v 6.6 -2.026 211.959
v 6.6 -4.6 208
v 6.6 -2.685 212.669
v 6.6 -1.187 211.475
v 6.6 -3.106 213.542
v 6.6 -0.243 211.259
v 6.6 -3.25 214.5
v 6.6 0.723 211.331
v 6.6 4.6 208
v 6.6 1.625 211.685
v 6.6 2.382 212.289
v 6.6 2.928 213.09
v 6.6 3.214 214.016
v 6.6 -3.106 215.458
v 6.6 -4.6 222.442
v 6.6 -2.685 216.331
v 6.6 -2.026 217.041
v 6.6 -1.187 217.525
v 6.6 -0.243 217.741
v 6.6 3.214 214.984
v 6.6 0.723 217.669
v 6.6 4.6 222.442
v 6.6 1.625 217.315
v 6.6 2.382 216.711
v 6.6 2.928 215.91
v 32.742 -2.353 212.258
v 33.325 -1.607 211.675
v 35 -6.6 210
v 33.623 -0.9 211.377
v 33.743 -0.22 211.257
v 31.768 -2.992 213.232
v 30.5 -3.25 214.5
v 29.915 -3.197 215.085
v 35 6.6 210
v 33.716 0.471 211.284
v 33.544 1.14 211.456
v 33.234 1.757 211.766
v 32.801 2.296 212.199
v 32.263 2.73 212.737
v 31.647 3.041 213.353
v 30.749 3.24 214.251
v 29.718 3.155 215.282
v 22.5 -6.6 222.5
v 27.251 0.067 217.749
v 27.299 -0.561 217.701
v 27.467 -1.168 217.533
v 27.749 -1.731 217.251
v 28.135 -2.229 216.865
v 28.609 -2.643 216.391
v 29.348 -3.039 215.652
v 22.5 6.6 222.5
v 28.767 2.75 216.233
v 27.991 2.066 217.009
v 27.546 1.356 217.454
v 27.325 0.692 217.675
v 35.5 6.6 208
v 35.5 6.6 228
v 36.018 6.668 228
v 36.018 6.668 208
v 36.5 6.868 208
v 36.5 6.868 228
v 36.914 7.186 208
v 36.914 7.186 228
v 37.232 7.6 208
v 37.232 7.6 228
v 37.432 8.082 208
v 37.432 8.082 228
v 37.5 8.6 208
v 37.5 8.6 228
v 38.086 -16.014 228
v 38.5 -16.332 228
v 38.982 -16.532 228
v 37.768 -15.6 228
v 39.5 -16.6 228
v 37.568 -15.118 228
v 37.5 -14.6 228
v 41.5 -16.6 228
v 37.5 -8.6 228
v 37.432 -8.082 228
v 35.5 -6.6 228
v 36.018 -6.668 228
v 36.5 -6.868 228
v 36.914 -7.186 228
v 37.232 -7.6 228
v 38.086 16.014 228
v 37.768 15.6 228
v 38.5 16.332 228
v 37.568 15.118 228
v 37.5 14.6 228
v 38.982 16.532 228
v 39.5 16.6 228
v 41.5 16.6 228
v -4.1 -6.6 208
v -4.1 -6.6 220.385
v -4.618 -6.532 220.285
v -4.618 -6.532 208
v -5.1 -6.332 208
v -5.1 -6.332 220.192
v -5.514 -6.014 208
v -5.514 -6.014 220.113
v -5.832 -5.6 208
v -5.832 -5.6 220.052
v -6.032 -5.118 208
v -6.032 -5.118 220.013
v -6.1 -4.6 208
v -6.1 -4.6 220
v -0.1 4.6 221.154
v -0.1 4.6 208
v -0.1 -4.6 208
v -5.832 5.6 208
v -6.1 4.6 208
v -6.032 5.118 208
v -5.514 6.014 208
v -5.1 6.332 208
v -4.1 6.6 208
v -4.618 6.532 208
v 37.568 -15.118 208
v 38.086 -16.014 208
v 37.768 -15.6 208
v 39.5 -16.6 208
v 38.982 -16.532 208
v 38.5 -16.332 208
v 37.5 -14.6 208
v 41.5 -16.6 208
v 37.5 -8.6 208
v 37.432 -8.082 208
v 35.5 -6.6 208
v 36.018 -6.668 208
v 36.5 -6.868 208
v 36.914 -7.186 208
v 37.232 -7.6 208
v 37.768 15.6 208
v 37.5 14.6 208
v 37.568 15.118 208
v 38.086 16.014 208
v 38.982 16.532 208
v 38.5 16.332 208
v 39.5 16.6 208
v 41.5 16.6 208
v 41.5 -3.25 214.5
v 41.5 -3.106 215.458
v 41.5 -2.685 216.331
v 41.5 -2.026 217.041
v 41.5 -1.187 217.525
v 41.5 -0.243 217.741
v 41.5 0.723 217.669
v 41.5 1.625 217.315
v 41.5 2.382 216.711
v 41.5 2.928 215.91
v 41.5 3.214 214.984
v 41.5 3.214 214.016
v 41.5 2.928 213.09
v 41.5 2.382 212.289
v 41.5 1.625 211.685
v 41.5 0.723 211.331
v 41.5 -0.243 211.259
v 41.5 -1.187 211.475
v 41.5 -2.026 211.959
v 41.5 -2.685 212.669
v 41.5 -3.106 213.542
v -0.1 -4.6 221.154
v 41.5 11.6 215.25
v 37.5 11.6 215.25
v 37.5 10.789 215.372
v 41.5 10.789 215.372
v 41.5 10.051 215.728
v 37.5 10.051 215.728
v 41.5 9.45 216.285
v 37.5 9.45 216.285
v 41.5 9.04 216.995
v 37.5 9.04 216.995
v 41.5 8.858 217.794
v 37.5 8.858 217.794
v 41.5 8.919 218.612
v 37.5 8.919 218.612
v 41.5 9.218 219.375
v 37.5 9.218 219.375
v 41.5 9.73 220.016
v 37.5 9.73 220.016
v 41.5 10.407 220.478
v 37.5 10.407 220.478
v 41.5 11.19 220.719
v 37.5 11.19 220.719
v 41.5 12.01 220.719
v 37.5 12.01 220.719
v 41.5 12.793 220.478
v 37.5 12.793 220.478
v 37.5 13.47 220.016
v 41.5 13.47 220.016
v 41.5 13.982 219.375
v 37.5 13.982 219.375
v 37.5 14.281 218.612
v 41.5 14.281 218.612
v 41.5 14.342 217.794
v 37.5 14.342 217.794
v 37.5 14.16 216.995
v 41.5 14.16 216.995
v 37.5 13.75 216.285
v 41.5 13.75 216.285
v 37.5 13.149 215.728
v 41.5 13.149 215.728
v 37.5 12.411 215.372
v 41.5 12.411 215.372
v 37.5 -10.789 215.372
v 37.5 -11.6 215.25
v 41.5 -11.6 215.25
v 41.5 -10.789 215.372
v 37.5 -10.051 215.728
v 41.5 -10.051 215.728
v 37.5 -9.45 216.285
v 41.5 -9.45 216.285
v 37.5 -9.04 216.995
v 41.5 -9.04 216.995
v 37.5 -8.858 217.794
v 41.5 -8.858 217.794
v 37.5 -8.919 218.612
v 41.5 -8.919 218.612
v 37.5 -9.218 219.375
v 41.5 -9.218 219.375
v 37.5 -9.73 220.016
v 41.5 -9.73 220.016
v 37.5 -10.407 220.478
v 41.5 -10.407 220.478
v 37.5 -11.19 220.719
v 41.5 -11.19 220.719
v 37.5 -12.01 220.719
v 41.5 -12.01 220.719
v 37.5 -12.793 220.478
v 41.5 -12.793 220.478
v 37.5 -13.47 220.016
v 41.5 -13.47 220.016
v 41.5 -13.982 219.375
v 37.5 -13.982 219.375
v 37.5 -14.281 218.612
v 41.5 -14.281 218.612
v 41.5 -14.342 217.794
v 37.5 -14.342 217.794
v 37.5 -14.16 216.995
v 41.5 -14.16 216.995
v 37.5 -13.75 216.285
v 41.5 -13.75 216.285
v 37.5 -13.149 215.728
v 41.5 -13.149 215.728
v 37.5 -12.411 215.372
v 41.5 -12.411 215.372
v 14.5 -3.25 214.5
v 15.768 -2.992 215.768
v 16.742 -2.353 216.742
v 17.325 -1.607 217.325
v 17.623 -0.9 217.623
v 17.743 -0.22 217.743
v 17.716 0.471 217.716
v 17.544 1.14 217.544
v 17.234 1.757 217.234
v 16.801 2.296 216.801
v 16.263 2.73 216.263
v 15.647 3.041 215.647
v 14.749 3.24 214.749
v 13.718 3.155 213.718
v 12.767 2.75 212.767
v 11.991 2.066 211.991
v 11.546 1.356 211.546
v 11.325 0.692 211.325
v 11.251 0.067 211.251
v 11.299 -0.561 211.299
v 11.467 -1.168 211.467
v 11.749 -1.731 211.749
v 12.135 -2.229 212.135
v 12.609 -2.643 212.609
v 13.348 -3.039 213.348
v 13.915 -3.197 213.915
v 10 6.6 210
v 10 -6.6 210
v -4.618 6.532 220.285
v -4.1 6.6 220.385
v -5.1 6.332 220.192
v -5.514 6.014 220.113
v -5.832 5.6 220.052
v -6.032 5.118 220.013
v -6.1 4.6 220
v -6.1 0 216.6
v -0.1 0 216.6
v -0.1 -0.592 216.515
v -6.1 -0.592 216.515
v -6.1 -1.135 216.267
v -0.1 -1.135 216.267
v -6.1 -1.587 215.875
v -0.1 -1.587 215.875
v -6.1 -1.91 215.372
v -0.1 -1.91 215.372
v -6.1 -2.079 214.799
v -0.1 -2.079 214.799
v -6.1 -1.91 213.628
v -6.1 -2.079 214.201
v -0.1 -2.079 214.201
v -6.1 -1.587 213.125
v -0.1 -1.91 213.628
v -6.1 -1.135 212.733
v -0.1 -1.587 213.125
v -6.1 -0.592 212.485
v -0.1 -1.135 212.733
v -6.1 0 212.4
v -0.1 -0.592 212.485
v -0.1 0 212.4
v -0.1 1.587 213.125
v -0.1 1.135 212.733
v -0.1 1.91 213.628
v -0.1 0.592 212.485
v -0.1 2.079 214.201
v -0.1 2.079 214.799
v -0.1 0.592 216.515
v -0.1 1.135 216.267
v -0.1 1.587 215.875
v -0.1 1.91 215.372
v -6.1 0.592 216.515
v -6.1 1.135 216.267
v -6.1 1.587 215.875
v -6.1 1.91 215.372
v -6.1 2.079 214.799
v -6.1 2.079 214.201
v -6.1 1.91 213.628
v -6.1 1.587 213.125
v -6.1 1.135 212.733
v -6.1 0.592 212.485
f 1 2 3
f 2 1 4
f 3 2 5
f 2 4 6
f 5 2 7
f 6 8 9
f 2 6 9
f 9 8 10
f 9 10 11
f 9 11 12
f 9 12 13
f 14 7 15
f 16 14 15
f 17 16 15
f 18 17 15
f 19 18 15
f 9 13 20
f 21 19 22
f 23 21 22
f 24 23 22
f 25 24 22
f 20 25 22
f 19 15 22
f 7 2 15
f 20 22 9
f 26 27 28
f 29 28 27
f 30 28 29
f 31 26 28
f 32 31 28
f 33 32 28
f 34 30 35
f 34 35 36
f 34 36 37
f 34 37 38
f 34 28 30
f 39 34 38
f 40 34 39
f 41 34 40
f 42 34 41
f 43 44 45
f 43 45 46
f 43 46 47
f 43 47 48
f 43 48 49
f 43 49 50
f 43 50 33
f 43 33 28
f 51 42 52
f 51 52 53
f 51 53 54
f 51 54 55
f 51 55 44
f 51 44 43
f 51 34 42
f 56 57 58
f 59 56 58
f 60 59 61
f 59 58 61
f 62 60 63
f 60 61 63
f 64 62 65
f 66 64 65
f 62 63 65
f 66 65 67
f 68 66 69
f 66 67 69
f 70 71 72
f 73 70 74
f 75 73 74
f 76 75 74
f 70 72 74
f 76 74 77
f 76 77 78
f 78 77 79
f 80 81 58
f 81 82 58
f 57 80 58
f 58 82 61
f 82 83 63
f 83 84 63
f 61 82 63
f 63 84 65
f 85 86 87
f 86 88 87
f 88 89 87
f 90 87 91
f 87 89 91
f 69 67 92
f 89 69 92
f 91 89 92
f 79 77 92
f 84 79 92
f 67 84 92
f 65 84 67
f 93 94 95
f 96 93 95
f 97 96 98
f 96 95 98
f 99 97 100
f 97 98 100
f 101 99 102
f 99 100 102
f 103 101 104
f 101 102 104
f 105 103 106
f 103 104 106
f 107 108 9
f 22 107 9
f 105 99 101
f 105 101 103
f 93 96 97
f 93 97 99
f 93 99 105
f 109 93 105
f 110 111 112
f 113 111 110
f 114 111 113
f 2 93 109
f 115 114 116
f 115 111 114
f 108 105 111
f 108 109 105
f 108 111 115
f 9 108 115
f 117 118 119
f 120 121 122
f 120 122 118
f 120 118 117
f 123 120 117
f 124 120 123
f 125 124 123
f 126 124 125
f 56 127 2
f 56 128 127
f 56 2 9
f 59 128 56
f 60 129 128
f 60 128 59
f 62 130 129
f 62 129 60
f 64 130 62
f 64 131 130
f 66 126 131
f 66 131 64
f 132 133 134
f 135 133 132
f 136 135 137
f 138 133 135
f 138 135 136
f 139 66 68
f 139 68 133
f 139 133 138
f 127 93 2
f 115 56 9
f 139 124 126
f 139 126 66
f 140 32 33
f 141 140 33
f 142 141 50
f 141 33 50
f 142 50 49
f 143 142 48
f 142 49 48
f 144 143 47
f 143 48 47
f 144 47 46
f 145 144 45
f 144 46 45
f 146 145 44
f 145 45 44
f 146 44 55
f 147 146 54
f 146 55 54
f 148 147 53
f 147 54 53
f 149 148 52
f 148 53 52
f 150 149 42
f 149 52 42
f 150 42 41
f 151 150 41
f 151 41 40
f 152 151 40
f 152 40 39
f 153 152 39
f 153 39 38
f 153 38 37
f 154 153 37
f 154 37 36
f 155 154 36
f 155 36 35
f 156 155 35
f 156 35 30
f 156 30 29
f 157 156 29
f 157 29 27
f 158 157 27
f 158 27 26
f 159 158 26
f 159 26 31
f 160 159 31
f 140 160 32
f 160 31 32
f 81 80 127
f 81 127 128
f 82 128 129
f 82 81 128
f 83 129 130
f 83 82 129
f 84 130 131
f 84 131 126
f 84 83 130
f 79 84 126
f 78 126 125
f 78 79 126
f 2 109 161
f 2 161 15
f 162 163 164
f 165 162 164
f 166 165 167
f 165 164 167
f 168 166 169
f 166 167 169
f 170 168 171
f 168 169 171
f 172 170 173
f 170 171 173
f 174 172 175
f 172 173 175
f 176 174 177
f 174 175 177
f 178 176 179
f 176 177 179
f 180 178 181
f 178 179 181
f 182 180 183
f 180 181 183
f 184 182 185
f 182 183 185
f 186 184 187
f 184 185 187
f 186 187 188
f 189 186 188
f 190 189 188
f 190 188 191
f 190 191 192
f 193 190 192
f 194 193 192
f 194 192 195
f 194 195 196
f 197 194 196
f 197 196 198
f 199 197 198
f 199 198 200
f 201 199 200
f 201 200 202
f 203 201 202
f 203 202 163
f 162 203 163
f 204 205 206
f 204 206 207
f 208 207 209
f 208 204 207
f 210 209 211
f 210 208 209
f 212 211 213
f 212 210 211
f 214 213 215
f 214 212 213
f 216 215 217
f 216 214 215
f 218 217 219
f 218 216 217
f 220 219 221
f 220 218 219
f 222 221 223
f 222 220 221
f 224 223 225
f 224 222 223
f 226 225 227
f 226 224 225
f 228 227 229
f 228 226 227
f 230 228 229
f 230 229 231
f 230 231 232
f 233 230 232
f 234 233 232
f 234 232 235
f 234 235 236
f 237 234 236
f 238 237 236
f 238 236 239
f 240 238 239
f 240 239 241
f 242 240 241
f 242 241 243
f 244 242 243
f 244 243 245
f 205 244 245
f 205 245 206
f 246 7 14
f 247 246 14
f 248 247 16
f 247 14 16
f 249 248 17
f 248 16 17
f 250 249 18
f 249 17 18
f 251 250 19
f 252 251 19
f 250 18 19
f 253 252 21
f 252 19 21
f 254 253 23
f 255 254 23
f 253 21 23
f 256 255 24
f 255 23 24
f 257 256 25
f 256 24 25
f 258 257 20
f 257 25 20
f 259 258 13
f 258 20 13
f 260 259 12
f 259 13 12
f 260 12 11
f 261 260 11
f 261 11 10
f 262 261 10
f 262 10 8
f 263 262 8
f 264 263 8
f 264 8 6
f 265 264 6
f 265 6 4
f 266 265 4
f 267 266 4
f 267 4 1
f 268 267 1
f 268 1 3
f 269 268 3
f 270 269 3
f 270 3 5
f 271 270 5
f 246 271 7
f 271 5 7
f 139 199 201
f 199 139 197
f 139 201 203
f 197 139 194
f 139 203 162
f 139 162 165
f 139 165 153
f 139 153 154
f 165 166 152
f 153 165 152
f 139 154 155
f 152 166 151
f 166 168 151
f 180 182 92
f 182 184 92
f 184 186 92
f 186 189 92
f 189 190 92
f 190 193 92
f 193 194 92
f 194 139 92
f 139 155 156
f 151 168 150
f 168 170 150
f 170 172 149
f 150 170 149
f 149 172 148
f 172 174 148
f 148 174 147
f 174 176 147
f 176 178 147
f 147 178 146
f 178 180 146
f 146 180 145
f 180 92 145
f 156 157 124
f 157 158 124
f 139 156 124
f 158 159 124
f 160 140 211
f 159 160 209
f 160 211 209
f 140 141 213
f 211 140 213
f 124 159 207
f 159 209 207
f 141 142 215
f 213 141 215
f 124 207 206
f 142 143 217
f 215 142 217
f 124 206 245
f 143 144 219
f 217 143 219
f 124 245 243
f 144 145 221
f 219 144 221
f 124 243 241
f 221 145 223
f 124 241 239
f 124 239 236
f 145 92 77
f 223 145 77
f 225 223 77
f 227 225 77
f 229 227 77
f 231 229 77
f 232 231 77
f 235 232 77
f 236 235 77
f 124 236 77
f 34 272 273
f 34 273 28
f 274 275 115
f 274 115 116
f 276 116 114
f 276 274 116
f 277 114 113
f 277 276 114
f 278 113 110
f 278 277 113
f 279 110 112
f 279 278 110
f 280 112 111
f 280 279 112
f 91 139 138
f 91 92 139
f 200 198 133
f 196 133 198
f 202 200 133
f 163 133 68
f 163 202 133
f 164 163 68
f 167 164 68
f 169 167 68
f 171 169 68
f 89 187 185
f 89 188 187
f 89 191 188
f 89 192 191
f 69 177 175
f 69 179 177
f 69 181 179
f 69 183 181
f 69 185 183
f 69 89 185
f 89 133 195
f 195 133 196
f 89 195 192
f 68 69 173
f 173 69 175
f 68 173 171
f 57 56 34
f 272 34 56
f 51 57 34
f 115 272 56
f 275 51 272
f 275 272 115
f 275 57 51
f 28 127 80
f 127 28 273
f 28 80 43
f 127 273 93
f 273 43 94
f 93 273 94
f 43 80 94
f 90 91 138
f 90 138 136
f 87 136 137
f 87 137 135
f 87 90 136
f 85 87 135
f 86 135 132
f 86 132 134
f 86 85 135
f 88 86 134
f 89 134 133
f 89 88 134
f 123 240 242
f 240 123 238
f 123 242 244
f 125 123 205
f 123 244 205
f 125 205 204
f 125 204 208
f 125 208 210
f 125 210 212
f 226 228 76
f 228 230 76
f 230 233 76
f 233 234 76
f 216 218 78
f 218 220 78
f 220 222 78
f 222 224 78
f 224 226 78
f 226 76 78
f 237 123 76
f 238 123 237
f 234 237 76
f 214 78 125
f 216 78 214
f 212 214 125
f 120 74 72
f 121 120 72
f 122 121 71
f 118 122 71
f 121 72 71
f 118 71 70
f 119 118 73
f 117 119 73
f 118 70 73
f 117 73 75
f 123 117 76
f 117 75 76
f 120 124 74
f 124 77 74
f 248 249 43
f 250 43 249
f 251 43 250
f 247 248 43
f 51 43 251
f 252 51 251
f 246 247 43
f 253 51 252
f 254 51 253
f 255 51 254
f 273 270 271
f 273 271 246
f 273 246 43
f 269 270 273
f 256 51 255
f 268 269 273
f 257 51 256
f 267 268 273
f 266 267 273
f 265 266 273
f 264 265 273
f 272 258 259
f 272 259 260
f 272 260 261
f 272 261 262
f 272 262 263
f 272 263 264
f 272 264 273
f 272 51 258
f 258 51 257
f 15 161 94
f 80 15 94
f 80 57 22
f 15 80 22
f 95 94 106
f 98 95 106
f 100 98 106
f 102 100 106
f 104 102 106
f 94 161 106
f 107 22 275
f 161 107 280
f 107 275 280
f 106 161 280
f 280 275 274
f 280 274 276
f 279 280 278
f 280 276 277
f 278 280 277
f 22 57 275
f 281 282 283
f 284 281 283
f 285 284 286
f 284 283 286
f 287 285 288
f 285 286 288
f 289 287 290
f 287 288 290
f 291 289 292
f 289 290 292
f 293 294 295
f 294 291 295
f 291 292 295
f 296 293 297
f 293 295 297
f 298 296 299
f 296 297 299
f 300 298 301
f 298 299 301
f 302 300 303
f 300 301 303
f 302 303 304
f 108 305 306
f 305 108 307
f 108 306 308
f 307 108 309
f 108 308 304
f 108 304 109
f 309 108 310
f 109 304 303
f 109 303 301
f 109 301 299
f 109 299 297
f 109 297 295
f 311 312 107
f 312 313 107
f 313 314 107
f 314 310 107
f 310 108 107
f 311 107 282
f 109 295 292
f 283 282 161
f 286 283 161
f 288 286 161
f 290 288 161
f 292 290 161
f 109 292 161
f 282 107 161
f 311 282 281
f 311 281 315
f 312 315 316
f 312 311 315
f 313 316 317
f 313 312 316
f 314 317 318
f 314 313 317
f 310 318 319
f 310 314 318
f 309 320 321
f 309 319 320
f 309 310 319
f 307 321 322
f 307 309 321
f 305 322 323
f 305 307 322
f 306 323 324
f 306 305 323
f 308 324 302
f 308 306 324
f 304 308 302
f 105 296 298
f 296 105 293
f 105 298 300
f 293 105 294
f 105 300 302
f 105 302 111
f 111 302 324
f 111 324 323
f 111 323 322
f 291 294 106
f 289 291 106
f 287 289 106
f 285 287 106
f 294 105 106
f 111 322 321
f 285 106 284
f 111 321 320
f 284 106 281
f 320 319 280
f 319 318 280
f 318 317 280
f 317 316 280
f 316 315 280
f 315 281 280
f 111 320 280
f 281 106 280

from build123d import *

# Parameters (mm, degrees)
PAD125_DEPTH            = 10
SKETCH264_R             = 2.75
POCKET112_DEPTH         = 41.501
SKETCH265_R             = 2.1
POCKET113_DEPTH         = 16
POCKET114_DEPTH         = 108.4688754286
POCKET114_DEPTH_BACK    = 125.0688754286
SKETCH_R                = 3.25
POCKET_DEPTH            = 34.901
BODY089_PITCH_ANGLE     = -90
BODY089_PLACEMENT_ANGLE = -180


with BuildPart() as part:
    # Sketch263 → Pad125 (new body, symmetric)
    with BuildSketch(Plane.YZ):
        with BuildLine():
            Line((-16.6, 41.5), (-16.6, 39.5))
            ThreePointArc((-16.6, 39.5), (-16.0142135624, 38.0857864376), (-14.6, 37.5))
            Line((-14.6, 37.5), (-8.6, 37.5))
            ThreePointArc((-6.6, 35.5), (-7.1857864376, 36.9142135624), (-8.6, 37.5))
            Line((-6.6, 35.5), (-6.6, -4.1))
            ThreePointArc((-6.6, -4.1), (-6.0142135624, -5.5142135624), (-4.6, -6.1))
            Line((-4.6, -6.1), (0, -6.1))
            Line((0, -6.1), (0, -0.1))
            Line((0, -0.1), (-4.6, -0.1))
            Line((-4.6, -0.1), (-4.6, 6.6))
            Line((-4.6, 6.6), (0, 6.6))
            Line((0, 6.6), (0, 41.5))
            Line((0, 41.5), (-16.6, 41.5))
        make_face()
    extrude(amount=PAD125_DEPTH, both=True)

    # Sketch264 → Pocket112 (cut, through all)
    with BuildSketch(Plane(origin=(0, 0, 0), x_dir=(-1, 0, 0), z_dir=(0, 0, -1))):
        with Locations((0, -11.6)):
            Circle(SKETCH264_R)
    extrude(amount=-POCKET112_DEPTH, mode=Mode.SUBTRACT)

    # Sketch265 (on Face7 of Pocket112) → Pocket113 (cut)
    with BuildSketch(Plane.YX.offset(0.1)):
        with Locations((0, -3.5)):
            Circle(SKETCH265_R)
    extrude(amount=POCKET113_DEPTH, mode=Mode.SUBTRACT)

    # Sketch266 → Pocket114 (cut, two sides)
    with BuildSketch(Plane.XZ) as pocket114_sk:
        Polygon((10, -6.1), (10, 35.5), (2, -6.1), align=None)
        Polygon((-8, 35), (4.5, 22.5), (-8, 10), align=None)
    extrude(amount=-POCKET114_DEPTH, mode=Mode.SUBTRACT)
    extrude(pocket114_sk.sketch, amount=POCKET114_DEPTH_BACK, mode=Mode.SUBTRACT)

    # Mirrored011: part across XZ


with BuildPart() as part_1:
    add(part.part)
    add(part.part.mirror(Plane.XZ))

    # Sketch (on Face24 of Mirrored011) → Pocket (cut, through all)
    with BuildSketch(Plane.YX.offset(-6.6)):
        with Locations((0, -3.5)):
            Circle(SKETCH_R)
    extrude(amount=-POCKET_DEPTH, mode=Mode.SUBTRACT)


with BuildPart() as part_2:
    # Body089 pitch: moved
    add(part_1.part.rotate(Axis((0, 0, 0), (0, 1, 0)), BODY089_PITCH_ANGLE))


with BuildPart() as part_3:
    # Body089 placement: moved
    add(part_2.part.moved(Location((0, 0, 218))).rotate(Axis((0, 0, 218), (0, 0, 1)), BODY089_PLACEMENT_ANGLE))


solid = part_3.part
